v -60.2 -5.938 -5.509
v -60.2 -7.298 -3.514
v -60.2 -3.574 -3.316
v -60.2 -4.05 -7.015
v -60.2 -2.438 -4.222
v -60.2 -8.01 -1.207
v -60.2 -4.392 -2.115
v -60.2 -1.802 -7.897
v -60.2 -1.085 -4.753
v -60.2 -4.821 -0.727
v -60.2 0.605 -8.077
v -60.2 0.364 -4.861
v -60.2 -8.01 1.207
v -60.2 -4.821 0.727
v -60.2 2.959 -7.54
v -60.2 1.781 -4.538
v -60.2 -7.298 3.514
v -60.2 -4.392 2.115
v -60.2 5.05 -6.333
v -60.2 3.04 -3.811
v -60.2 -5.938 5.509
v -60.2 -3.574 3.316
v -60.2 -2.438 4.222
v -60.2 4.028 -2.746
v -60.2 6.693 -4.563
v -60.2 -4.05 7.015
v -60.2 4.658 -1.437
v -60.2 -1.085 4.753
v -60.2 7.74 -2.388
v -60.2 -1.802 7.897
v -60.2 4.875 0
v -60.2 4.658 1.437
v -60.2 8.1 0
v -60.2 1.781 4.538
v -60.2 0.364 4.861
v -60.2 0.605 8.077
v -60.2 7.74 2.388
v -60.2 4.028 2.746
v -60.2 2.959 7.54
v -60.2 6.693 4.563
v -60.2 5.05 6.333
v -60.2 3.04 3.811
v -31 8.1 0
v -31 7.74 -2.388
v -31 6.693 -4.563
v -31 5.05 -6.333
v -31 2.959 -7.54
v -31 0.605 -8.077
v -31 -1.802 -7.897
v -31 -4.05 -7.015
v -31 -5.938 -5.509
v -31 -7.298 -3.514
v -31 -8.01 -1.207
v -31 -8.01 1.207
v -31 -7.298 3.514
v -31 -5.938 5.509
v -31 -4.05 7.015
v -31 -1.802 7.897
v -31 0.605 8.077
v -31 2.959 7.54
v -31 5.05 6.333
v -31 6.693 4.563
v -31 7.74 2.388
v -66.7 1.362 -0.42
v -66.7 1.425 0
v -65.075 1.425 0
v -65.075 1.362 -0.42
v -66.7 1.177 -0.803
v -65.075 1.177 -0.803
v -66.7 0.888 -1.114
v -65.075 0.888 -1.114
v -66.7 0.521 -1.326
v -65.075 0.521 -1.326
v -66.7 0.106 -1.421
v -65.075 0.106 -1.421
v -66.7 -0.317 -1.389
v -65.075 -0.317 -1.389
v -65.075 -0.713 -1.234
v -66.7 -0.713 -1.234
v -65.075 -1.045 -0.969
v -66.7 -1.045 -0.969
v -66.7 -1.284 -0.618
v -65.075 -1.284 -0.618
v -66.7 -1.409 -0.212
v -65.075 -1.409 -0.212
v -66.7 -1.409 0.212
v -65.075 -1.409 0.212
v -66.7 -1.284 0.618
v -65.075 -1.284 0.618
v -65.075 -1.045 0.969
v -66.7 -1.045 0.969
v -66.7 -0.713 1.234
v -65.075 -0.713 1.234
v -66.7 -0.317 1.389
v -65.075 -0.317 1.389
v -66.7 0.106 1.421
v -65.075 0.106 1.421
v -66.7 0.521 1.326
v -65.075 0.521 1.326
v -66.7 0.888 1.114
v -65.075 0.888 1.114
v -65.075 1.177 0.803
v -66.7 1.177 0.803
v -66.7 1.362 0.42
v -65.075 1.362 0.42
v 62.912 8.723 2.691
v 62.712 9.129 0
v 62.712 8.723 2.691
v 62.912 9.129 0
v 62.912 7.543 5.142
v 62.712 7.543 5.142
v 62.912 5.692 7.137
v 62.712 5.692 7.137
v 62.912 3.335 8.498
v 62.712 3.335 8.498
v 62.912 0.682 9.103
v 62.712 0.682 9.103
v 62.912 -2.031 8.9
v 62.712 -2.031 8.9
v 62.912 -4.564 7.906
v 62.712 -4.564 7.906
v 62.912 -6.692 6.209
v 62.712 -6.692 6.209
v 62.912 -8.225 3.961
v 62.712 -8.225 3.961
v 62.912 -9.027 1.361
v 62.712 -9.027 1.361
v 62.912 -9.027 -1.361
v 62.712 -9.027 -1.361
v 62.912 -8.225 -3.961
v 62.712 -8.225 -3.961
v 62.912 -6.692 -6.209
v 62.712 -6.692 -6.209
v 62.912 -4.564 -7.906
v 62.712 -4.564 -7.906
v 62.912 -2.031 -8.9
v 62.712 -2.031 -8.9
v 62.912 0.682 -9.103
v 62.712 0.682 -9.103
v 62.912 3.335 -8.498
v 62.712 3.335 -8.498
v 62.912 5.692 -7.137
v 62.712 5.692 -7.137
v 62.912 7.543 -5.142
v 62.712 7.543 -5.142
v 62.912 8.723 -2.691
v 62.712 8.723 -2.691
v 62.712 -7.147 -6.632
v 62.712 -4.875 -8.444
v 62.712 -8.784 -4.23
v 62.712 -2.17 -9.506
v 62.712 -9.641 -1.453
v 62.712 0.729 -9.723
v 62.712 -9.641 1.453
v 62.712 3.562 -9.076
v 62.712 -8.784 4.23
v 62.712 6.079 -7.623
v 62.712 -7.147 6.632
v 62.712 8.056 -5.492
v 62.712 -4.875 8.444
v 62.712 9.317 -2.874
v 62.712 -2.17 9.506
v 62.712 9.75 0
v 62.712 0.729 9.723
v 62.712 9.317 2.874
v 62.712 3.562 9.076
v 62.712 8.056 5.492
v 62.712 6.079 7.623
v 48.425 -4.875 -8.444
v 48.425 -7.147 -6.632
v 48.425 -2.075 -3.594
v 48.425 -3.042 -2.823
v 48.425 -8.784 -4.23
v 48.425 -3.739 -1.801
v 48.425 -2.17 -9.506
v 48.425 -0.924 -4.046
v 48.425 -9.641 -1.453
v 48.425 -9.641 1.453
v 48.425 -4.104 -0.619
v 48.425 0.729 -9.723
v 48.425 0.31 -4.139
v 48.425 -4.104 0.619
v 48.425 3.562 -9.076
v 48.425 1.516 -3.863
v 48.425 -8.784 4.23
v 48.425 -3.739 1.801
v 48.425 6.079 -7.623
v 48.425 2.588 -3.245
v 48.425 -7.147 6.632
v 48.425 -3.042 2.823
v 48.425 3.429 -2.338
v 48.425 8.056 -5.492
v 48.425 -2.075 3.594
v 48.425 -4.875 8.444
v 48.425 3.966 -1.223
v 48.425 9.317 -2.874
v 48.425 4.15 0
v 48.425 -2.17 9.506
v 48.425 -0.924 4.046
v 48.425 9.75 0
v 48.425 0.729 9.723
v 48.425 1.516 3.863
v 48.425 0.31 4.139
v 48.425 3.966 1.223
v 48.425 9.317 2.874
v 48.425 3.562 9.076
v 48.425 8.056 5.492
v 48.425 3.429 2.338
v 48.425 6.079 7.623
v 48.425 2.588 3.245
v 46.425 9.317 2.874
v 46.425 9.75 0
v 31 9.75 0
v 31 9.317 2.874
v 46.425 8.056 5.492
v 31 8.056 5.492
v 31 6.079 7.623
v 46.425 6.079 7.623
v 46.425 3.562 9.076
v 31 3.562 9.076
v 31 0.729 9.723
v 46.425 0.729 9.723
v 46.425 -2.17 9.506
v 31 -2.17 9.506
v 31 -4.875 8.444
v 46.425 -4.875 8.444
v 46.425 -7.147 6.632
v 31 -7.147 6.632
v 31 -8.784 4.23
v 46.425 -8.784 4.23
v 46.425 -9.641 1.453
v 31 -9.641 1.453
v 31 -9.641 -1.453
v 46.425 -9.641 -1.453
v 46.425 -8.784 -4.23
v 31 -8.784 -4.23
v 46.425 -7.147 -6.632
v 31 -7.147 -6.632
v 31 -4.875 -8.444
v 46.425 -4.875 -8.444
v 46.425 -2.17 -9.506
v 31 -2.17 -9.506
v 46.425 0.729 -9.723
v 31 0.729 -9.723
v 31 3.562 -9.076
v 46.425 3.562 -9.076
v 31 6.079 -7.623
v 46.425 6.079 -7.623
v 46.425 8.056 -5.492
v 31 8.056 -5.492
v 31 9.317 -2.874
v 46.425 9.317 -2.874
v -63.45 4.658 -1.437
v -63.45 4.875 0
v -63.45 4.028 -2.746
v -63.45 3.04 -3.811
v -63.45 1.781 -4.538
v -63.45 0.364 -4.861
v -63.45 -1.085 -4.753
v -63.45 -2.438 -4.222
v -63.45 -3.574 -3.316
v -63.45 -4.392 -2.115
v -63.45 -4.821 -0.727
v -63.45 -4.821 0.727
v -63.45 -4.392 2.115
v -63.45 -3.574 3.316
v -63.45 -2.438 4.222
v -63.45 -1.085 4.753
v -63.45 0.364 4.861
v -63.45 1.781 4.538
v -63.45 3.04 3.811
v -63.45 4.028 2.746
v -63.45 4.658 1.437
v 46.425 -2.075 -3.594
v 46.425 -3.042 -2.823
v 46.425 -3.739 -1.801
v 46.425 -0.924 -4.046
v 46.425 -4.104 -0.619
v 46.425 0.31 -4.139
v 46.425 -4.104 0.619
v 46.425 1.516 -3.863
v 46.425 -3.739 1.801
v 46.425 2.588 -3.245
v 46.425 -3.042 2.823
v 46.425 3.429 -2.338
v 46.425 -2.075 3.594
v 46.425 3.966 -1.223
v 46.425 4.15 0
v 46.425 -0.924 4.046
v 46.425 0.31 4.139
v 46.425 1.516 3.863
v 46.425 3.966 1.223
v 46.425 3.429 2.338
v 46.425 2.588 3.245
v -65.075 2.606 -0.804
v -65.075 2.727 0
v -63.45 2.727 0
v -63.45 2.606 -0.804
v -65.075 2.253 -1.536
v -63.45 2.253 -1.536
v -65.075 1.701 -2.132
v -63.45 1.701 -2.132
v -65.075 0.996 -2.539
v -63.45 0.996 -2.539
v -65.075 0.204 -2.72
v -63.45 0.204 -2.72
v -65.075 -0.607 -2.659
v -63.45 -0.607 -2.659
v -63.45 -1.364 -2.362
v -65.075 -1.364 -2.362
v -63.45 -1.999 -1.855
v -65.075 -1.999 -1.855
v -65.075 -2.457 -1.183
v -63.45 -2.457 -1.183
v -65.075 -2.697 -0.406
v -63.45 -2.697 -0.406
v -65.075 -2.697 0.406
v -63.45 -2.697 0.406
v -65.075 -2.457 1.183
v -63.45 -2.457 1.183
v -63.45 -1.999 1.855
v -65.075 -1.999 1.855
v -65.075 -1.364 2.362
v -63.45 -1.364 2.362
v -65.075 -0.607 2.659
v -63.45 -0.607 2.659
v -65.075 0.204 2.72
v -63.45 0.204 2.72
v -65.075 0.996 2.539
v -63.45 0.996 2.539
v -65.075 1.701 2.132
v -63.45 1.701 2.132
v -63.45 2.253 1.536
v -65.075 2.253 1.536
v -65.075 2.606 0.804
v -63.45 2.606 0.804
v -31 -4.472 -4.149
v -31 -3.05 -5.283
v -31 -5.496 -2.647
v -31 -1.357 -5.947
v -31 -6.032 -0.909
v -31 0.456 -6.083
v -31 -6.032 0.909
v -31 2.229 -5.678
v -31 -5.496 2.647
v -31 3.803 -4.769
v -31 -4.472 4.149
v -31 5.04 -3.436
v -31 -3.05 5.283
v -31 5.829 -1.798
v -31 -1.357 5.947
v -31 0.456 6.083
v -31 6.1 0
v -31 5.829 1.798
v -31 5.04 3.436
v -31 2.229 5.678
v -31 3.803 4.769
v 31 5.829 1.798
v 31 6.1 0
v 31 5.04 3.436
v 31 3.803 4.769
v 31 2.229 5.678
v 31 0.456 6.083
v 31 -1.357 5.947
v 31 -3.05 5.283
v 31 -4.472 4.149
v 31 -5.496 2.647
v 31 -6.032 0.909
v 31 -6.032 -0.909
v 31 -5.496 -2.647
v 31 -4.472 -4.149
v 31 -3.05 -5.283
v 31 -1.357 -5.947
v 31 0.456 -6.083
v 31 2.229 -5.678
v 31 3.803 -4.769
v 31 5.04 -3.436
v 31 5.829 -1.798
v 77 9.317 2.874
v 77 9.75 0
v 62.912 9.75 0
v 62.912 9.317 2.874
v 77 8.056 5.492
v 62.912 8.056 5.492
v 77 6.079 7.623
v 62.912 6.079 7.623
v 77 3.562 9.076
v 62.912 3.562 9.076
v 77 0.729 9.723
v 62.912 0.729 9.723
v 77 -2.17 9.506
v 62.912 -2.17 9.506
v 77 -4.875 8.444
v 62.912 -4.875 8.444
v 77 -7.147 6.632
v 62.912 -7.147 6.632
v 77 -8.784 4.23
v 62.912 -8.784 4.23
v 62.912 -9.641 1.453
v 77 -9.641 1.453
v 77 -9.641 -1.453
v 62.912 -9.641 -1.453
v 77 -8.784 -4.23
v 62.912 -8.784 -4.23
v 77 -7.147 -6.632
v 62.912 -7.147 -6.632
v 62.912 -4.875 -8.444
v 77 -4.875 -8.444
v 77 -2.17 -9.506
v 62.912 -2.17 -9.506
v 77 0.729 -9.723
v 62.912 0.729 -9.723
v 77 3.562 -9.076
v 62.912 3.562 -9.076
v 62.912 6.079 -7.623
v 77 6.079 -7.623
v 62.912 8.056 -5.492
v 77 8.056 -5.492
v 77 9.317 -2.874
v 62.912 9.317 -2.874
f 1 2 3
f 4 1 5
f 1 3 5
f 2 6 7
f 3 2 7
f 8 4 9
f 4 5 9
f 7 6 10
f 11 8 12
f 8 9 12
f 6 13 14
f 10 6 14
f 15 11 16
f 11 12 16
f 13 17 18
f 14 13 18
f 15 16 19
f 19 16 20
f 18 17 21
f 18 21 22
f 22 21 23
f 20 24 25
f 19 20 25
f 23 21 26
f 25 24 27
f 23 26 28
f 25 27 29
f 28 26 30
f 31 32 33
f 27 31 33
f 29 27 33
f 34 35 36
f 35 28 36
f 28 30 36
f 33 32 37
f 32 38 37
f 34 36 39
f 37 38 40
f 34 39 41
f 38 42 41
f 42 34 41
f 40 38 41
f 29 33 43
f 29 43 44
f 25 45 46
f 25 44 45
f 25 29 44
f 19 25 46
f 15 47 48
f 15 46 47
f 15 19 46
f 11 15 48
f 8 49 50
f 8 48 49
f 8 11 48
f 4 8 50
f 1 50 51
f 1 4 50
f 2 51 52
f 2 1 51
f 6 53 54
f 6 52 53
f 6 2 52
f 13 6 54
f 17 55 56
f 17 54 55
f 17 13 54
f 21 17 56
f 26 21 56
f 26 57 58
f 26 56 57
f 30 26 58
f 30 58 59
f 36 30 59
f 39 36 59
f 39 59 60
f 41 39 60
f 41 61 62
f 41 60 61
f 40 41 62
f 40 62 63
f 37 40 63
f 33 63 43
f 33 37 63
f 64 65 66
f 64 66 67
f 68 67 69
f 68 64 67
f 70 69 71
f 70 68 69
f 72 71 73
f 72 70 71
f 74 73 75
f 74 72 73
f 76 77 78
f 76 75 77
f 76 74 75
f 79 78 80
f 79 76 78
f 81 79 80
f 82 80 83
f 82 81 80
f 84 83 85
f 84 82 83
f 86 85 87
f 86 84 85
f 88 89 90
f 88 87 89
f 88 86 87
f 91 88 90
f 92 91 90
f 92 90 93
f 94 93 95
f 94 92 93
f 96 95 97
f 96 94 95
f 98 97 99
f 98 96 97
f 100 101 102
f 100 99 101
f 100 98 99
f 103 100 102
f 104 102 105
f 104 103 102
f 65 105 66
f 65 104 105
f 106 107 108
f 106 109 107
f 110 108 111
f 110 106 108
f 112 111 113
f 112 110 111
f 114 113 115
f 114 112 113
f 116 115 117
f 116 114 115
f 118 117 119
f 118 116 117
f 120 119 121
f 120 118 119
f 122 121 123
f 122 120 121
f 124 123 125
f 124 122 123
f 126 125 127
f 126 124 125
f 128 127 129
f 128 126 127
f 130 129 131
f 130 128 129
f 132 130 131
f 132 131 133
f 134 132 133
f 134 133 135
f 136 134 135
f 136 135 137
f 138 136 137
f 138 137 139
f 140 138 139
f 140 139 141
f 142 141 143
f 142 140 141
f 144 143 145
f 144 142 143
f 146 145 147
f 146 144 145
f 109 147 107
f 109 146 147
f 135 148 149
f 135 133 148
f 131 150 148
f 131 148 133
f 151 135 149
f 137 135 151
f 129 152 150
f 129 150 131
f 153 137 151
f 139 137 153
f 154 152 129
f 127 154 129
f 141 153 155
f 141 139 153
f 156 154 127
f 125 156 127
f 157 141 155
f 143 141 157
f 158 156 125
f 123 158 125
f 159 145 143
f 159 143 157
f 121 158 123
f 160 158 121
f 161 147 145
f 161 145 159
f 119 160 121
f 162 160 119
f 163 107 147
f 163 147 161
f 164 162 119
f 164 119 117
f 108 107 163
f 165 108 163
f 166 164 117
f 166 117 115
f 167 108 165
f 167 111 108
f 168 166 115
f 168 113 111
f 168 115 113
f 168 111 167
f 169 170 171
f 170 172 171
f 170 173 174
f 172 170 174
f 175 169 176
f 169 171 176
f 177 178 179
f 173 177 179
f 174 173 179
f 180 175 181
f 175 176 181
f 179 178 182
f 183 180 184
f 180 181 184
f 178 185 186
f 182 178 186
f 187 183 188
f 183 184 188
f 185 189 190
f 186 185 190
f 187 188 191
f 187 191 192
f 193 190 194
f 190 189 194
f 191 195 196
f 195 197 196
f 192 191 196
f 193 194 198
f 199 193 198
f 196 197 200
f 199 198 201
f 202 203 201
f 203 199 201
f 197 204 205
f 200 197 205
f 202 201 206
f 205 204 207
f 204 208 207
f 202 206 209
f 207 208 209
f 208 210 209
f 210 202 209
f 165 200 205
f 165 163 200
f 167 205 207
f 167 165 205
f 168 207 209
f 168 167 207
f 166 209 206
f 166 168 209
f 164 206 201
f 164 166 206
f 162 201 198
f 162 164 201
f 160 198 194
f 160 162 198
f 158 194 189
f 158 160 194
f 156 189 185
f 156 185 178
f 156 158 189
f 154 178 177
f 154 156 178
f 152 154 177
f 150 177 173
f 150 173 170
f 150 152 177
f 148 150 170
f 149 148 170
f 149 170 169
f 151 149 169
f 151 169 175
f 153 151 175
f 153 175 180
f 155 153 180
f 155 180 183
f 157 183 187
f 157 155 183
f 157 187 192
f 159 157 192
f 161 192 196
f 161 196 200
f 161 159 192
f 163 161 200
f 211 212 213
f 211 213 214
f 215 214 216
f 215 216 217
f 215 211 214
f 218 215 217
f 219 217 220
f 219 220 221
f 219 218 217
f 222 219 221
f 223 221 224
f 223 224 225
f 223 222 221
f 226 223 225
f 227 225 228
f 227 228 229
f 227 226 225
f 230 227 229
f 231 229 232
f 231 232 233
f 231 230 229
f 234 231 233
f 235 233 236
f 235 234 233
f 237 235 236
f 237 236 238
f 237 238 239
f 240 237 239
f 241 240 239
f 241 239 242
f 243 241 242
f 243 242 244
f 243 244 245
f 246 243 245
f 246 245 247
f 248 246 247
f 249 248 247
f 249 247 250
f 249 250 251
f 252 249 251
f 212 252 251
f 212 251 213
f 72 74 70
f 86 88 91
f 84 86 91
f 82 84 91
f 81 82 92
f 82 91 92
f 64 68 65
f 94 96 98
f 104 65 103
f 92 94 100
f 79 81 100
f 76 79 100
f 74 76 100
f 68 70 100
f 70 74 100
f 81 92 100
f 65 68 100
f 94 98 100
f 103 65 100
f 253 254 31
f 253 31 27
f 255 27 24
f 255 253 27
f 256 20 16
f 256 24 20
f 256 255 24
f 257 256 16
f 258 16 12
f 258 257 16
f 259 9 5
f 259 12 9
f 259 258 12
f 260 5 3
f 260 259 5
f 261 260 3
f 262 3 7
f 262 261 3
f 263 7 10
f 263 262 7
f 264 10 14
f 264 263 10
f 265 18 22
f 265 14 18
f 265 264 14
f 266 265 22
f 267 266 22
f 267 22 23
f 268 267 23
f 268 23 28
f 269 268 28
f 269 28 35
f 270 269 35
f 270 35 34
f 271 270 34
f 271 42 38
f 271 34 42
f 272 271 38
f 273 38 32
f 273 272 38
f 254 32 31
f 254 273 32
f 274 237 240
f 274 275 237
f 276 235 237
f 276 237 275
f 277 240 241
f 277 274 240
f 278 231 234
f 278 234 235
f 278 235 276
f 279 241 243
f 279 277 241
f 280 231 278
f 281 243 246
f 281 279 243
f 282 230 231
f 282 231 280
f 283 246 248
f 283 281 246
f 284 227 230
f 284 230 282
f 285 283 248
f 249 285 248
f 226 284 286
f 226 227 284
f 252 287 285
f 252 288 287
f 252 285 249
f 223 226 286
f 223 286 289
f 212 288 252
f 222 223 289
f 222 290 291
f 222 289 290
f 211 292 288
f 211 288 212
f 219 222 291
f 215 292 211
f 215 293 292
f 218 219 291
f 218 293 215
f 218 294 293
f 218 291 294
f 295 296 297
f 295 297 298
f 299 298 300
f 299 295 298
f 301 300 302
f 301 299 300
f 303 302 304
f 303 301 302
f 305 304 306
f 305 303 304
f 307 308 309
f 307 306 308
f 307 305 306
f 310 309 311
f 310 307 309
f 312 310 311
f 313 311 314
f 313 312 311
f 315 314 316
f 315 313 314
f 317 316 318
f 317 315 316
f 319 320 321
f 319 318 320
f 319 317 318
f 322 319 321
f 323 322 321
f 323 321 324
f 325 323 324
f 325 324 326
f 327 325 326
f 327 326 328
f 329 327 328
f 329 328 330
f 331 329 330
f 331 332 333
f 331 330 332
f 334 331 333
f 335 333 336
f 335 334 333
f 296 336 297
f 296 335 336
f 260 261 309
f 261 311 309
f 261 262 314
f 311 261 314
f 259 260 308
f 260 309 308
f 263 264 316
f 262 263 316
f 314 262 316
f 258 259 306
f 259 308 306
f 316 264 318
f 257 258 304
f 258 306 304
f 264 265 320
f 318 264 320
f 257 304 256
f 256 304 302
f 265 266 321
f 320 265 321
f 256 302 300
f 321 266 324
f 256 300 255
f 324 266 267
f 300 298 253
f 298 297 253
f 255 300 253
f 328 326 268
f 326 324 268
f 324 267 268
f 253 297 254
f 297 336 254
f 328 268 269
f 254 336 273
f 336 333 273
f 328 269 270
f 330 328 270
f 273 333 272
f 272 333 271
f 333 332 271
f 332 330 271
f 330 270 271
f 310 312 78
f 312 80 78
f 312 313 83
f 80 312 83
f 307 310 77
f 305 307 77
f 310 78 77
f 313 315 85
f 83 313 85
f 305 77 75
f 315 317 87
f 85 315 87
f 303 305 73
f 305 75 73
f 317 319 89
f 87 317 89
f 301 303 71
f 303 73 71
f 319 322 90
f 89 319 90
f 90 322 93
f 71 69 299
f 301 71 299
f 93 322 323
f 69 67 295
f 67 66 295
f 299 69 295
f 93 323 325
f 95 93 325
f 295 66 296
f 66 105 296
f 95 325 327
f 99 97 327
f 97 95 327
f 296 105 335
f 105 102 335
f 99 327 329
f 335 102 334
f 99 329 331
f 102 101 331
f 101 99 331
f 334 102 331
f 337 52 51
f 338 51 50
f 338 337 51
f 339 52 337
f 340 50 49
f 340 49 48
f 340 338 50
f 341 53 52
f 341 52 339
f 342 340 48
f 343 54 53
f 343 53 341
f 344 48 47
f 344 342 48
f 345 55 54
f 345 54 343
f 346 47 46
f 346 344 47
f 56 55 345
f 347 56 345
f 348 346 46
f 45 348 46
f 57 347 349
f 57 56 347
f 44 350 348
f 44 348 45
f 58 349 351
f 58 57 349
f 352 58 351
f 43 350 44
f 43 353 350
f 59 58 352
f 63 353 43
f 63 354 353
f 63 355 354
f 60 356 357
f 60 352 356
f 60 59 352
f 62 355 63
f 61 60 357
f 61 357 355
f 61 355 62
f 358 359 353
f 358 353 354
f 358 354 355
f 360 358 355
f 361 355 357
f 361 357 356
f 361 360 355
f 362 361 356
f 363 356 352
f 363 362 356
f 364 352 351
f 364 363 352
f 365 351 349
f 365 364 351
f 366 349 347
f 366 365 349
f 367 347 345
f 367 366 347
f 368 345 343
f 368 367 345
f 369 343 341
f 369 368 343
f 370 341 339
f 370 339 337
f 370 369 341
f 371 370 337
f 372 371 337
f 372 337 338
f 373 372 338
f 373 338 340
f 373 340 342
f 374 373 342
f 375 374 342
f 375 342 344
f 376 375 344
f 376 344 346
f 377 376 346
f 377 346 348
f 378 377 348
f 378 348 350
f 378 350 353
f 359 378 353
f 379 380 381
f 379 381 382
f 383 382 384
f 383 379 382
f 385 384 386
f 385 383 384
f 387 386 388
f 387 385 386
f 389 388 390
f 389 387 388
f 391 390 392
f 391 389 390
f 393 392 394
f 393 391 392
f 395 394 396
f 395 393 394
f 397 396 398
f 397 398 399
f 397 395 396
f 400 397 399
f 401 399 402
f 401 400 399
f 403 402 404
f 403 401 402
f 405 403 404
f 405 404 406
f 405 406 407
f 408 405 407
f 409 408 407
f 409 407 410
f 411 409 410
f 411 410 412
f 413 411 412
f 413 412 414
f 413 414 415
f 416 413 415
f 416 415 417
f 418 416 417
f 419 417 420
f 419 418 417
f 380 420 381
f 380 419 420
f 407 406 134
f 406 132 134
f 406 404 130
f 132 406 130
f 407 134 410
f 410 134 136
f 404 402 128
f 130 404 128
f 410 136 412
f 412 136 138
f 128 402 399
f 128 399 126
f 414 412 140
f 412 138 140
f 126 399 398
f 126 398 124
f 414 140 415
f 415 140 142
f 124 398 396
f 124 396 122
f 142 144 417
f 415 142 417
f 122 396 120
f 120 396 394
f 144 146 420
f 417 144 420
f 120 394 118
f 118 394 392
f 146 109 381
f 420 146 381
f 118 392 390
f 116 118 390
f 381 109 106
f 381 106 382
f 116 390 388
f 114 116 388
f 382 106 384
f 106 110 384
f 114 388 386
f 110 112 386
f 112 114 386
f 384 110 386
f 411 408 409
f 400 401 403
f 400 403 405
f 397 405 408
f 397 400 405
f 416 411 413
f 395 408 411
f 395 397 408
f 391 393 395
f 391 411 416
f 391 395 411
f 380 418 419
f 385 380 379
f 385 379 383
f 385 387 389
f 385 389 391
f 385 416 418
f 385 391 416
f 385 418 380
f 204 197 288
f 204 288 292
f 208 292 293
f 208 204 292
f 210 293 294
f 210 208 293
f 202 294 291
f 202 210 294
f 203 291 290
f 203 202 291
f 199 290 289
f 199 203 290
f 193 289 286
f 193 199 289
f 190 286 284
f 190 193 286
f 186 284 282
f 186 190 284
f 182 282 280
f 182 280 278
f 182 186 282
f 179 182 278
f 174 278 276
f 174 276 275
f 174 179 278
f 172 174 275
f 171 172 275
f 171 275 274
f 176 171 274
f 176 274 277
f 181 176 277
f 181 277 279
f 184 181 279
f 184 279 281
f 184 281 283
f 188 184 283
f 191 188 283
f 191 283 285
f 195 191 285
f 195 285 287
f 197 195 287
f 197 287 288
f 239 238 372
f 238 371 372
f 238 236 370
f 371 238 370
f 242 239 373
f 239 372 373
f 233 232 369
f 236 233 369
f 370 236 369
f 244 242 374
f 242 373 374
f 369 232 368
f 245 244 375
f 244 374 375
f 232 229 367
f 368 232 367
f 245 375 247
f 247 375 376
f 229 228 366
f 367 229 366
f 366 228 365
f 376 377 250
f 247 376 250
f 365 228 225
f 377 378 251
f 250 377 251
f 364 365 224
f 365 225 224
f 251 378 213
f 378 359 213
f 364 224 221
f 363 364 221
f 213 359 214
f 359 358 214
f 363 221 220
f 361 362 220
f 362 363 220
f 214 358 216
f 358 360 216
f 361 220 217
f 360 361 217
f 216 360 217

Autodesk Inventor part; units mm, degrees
ref_plane "YZ Plane" through (0, 0, 0) normal (1, 0, 0) x (0, 1, 0)
ref_plane "XZ Plane" through (0, 0, 0) normal (0, 1, 0) x (-1, 0, 0)
ref_plane "XY Plane" through (0, 0, 0) normal (0, 0, 1) x (1, 0, 0)
sketch "Sketch1" plane through (0, 0, 0) normal (0, 0, 1) x (1, 0, 0)
  line L0 (-31, 6.1) -> (0, 6.1)
  line L1 (0, 6.1) -> (31, 6.1)
  line L2 (0, 10.5424) -> (0, 0) construction
  line L3 (31, 9.75) -> (31, 6.1)
  line L4 (77, 9.75) -> (77, 0)
  line L5 (46.4247, 9.75) -> (46.4247, 4.1503)
  line L6 (46.4247, 4.1503) -> (48.4247, 4.1503)
  line L7 (48.4247, 4.1503) -> (48.4247, 9.75)
  line L8 (31, 9.75) -> (46.4247, 9.75) construction
  line L9 (31, 9.75) -> (46.4247, 9.75)
  line L10 (62.7124, 9.75) -> (62.7124, 9.1289)
  line L11 (62.7124, 9.1289) -> (62.9117, 9.1289)
  line L12 (62.9117, 9.1289) -> (62.9117, 9.75)
  line L13 (48.4247, 9.75) -> (62.7124, 9.75) construction
  line L14 (62.9117, 9.75) -> (77, 9.75) construction
  line L15 (48.4247, 9.75) -> (62.7124, 9.75)
  line L16 (62.9117, 9.75) -> (77, 9.75)
  line L17 (-31, 8.1) -> (-60.2, 8.1)
  line L18 (-60.2, 8.1) -> (-60.2, 0)
  line L19 (-31, 8.1) -> (-31, 6.1)
  line L20 (-60.2, 4.875) -> (-63.45, 4.875)
  line L21 (-66.7, 0) -> (-60.2, 0)
  line L22 (-63.45, 4.875) -> (-63.45, 2.7274)
  line L23 (-63.45, 2.7274) -> (-65.075, 2.7274)
  line L24 (-65.075, 2.7274) -> (-65.075, 1.425)
  line L25 (-65.075, 1.425) -> (-66.7, 1.425)
  line L26 (-66.7, 1.425) -> (-66.7, 0)
  line L27 (-60.2, 0) -> (77, 0)
  line L28 (-95.44, 0) -> (105.74, 0) projected
  dimension "d1" = 31
  dimension "d2" = 31
  dimension "d3" = 6.1
  dimension "d4" = 46
  dimension "d6" = 2
  dimension "d7" = 29.2
  dimension "d8" = 8.1
  dimension "d10" = 1.425
  dimension "d11" = 6.5
revolve "Revolution1" add sketch "Sketch1" angle 360 about axis through (-10, 0, 0) along (1, 0, 0)
properties part number "PH Monitor"
